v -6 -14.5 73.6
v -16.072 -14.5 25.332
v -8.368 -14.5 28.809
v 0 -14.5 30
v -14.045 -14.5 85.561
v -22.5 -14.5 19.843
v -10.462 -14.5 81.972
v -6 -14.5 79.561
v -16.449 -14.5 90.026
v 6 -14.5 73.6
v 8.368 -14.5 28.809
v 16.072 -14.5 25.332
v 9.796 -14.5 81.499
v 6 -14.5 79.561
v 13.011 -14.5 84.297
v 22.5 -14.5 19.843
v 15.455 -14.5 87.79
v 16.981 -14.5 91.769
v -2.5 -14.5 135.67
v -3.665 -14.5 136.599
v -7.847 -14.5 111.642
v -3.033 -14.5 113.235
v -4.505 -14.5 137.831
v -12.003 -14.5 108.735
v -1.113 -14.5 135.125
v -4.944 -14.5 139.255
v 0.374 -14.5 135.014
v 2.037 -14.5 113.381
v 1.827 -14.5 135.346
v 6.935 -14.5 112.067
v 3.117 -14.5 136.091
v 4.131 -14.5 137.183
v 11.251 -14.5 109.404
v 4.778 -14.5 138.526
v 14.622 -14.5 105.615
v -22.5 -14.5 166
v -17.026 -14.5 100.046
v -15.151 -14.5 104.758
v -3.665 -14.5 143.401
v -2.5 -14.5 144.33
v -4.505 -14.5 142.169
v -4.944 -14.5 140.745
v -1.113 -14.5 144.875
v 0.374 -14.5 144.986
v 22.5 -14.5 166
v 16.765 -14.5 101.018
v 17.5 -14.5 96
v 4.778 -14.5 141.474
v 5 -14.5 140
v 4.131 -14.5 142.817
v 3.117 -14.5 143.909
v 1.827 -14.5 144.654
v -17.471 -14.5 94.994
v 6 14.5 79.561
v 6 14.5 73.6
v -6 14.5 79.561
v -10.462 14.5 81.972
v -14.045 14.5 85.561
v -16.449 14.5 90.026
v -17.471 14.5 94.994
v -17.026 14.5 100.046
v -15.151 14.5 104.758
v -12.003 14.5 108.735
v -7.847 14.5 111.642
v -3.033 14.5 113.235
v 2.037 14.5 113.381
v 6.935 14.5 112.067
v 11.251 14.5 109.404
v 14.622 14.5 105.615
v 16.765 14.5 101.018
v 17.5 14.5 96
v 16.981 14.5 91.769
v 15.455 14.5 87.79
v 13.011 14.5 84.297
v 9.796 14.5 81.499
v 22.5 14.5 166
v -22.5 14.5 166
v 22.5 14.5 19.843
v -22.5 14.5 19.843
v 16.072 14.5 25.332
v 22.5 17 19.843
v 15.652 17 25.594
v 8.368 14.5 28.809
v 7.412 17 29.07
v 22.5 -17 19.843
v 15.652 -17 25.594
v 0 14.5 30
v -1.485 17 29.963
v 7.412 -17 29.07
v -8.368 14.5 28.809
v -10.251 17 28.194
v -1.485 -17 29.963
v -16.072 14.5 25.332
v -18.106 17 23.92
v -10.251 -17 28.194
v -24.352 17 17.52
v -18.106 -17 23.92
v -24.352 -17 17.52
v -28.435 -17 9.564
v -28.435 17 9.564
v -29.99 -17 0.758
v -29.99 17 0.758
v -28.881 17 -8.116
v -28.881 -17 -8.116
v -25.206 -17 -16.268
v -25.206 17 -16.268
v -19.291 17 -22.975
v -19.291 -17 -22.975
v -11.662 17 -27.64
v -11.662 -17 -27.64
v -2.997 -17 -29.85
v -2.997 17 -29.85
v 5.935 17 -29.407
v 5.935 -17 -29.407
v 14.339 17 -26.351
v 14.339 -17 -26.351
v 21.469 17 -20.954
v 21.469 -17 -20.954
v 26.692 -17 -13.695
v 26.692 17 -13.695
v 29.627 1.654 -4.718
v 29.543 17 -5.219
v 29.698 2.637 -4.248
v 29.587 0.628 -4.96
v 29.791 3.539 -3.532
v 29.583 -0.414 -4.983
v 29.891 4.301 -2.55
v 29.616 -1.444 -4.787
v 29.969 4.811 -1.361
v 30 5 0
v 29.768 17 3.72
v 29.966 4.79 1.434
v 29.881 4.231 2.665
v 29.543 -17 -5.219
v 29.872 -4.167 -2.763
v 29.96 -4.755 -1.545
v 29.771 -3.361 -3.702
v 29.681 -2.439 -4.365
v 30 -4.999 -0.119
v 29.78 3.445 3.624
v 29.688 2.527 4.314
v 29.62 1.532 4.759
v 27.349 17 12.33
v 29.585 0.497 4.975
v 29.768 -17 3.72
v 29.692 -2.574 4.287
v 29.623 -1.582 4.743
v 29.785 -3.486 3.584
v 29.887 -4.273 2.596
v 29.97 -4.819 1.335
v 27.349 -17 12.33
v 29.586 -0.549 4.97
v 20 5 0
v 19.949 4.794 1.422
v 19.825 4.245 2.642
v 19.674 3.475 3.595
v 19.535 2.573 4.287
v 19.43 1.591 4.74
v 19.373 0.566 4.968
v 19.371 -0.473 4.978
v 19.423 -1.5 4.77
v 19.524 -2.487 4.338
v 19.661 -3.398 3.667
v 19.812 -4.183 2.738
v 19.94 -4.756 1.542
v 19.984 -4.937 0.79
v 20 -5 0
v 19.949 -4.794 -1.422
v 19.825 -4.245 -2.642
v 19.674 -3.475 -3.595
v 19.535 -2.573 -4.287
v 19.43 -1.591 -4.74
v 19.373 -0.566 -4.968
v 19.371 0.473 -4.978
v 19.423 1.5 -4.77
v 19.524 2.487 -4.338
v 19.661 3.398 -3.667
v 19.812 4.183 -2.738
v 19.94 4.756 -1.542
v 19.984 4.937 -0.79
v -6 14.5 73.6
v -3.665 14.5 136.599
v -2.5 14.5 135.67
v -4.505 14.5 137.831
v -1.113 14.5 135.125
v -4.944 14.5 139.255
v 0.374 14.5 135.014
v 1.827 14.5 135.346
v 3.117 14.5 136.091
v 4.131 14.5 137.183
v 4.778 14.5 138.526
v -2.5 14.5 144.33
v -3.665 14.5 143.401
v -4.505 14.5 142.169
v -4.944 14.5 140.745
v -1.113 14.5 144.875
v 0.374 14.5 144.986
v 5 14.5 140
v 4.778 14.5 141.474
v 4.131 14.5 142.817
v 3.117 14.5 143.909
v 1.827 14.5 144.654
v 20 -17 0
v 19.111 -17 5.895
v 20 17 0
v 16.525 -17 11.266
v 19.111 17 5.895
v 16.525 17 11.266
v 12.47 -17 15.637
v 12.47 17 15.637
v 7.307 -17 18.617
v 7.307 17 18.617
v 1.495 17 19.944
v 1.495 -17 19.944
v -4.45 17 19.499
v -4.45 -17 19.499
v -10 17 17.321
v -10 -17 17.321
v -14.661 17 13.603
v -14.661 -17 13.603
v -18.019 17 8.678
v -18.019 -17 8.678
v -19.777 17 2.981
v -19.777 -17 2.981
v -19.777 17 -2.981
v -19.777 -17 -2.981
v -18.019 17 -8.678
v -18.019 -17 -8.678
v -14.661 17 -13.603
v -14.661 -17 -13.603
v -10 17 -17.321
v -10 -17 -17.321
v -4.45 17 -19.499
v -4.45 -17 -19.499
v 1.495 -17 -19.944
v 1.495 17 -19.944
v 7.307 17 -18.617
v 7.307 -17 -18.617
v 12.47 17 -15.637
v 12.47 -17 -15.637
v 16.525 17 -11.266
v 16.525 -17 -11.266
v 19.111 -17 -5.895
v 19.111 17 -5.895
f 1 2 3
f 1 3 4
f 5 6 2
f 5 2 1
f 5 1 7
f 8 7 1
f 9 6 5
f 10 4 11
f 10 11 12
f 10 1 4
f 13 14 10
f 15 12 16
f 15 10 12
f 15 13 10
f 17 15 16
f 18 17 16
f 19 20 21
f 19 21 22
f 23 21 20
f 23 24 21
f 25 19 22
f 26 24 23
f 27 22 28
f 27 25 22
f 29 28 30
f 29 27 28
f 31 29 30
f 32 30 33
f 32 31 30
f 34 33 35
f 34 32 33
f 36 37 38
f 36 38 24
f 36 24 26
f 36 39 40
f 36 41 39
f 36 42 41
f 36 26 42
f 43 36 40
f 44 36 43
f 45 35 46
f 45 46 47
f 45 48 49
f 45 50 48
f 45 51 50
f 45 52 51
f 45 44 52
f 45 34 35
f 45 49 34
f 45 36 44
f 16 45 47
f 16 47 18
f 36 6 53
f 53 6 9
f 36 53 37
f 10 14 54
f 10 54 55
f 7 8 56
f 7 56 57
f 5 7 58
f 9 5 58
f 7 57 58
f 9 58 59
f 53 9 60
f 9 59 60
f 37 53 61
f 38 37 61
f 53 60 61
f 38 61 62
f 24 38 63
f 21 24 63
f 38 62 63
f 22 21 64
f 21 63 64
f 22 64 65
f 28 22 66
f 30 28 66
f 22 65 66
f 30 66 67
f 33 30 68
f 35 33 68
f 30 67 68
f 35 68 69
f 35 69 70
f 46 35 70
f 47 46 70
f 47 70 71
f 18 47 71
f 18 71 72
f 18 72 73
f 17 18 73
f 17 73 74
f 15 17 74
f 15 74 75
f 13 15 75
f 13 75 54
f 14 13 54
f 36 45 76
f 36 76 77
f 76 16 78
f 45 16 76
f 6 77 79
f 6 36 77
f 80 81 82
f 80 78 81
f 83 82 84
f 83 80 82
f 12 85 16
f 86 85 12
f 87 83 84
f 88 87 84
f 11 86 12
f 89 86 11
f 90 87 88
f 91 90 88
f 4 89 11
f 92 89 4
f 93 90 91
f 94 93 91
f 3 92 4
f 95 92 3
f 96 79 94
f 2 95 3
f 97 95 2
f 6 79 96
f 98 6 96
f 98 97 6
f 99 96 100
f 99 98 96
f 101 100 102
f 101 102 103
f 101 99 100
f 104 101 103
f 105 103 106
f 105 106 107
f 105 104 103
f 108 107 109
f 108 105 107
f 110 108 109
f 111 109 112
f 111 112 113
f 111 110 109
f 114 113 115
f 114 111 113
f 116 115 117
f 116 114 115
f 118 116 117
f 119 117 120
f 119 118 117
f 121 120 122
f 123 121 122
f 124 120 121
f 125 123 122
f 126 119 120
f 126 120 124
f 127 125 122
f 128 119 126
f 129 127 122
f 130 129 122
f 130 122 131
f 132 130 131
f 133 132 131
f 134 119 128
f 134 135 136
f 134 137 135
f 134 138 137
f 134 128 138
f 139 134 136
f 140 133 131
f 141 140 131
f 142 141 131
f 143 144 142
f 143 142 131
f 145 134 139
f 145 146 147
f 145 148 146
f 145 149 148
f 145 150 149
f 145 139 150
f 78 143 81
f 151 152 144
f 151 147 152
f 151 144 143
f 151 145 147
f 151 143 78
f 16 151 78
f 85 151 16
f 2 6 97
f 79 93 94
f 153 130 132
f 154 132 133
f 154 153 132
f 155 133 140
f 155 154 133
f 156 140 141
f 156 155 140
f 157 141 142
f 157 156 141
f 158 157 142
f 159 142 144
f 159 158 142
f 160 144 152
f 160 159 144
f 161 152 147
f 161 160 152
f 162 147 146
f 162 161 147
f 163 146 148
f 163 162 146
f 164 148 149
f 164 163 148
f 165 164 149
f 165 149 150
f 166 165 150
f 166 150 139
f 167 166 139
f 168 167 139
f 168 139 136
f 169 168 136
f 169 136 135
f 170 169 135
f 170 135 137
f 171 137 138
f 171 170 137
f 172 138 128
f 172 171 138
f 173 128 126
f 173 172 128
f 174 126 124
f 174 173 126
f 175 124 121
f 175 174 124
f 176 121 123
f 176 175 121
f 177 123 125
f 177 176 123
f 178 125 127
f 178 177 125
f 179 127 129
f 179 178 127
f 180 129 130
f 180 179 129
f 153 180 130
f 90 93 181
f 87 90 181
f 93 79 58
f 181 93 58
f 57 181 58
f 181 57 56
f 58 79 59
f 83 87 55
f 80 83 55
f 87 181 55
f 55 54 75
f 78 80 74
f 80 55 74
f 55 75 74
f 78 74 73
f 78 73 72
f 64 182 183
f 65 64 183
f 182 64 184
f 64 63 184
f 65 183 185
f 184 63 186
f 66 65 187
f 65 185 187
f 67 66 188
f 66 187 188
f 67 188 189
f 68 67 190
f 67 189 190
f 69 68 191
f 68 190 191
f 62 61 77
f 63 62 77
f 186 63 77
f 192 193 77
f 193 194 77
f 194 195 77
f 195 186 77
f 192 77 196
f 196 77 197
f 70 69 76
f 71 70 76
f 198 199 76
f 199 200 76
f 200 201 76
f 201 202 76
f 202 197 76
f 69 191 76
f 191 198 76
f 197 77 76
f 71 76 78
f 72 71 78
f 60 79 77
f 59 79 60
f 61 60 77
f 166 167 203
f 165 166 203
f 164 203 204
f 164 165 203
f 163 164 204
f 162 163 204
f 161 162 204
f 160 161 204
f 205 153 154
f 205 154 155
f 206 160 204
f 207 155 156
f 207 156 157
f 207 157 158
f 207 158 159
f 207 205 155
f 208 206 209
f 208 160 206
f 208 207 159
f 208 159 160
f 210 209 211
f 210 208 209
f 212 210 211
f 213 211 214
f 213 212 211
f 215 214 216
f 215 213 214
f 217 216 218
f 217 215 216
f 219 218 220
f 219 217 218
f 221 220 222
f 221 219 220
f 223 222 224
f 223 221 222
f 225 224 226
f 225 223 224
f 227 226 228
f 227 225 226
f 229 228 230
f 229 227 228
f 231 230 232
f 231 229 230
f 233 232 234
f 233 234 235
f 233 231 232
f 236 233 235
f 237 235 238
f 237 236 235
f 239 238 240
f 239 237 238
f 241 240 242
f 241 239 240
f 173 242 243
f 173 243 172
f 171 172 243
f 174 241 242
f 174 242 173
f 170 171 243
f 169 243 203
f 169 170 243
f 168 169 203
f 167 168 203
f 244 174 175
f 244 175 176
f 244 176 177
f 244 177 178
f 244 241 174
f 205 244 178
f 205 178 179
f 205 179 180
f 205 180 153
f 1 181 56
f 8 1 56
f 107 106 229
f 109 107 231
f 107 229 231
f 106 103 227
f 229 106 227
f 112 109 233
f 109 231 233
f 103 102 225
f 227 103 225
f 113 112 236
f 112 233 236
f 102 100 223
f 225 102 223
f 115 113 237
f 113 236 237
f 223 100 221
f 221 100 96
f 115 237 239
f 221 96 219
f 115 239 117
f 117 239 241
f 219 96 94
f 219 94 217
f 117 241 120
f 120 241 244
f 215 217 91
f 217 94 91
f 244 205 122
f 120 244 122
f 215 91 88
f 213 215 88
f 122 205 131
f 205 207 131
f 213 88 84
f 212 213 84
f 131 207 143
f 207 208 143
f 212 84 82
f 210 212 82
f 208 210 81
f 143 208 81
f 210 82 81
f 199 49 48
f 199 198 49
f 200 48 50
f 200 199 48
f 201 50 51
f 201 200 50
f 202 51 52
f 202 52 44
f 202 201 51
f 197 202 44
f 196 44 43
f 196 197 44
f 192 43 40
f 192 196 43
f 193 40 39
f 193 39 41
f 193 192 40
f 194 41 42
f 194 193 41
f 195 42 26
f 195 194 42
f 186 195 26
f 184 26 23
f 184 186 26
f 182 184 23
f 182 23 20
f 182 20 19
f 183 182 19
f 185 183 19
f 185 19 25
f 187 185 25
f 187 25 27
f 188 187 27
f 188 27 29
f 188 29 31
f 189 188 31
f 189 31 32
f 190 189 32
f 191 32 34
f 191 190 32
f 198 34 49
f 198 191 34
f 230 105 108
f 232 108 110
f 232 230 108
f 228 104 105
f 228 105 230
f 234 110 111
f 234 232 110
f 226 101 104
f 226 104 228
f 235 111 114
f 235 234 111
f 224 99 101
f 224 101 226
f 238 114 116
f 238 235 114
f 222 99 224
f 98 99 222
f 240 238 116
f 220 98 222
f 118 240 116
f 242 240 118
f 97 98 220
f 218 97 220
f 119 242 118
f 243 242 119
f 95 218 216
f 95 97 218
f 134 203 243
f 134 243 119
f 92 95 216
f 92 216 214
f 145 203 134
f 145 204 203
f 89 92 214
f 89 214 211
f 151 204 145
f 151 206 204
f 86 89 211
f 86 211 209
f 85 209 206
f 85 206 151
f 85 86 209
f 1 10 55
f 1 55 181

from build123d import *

# Parameters (mm, degrees)
F0_R     = 20
F1_DEPTH = 17
F2_R     = 5
F3_DEPTH = 30.001
F4_DEPTH = 12.5
F0_R_2   = 5
F5_DEPTH = 14.5


# Not quite as in the source:
# - a feature names something its author has since deleted; it is built from what else it names


with BuildPart() as f1:
    # F0 (on Front) → F1 (new body, symmetric)
    with BuildSketch(Plane.XZ):
        with BuildLine():
            ThreePointArc((-22.5, 19.843134833), (-10.6066017178, -28.0624304008), (30, 0))
            ThreePointArc((30, 0), (28.0624304008, 10.6066017178), (22.5, 19.843134833))
            ThreePointArc((22.5, 19.843134833), (0, 30), (-22.5, 19.843134833))
        make_face()
        Circle(F0_R, mode=Mode.SUBTRACT)
    extrude(amount=F1_DEPTH, both=True)

    # F2 (on Right) → F3 (cut, through all)
    with BuildSketch(Plane.YZ):
        Circle(F2_R)
    extrude(amount=F3_DEPTH, mode=Mode.SUBTRACT)

    # F0 (on Front) → F4 (cut, symmetric)
    with BuildSketch(Plane.XZ):
        with BuildLine():
            ThreePointArc((6, 79.5607177772), (0, 78.5), (-6, 79.5607177772))
            Line((-6, 79.5607177772), (-6, 73.6))
            Line((-6, 73.6), (6, 73.6))
            Line((6, 73.6), (6, 79.5607177772))
        make_face()
    extrude(amount=F4_DEPTH, both=True, mode=Mode.SUBTRACT)

    # F0 (on Front) → F5 (join, symmetric)
    with BuildSketch(Plane.XZ):
        with BuildLine():
            ThreePointArc((-22.5, 19.843134833), (0, 30), (22.5, 19.843134833))
            Line((22.5, 19.843134833), (22.5, 166))
            Line((22.5, 166), (-22.5, 166))
            Line((-22.5, 166), (-22.5, 19.843134833))
        make_face()
        with BuildLine():
            ThreePointArc((-6, 79.5607177772), (-10.0312013239, 110.3396303997), (17.5, 96))
            ThreePointArc((17.5, 96), (14.3396303997, 85.9687986761), (6, 79.5607177772))
            Line((6, 79.5607177772), (6, 73.6))
            Line((6, 73.6), (-6, 73.6))
            Line((-6, 73.6), (-6, 79.5607177772))
        make_face(mode=Mode.SUBTRACT)
        with Locations((0, 140)):
            Circle(F0_R_2, mode=Mode.SUBTRACT)
    extrude(amount=F5_DEPTH, both=True)


solid = f1.part
